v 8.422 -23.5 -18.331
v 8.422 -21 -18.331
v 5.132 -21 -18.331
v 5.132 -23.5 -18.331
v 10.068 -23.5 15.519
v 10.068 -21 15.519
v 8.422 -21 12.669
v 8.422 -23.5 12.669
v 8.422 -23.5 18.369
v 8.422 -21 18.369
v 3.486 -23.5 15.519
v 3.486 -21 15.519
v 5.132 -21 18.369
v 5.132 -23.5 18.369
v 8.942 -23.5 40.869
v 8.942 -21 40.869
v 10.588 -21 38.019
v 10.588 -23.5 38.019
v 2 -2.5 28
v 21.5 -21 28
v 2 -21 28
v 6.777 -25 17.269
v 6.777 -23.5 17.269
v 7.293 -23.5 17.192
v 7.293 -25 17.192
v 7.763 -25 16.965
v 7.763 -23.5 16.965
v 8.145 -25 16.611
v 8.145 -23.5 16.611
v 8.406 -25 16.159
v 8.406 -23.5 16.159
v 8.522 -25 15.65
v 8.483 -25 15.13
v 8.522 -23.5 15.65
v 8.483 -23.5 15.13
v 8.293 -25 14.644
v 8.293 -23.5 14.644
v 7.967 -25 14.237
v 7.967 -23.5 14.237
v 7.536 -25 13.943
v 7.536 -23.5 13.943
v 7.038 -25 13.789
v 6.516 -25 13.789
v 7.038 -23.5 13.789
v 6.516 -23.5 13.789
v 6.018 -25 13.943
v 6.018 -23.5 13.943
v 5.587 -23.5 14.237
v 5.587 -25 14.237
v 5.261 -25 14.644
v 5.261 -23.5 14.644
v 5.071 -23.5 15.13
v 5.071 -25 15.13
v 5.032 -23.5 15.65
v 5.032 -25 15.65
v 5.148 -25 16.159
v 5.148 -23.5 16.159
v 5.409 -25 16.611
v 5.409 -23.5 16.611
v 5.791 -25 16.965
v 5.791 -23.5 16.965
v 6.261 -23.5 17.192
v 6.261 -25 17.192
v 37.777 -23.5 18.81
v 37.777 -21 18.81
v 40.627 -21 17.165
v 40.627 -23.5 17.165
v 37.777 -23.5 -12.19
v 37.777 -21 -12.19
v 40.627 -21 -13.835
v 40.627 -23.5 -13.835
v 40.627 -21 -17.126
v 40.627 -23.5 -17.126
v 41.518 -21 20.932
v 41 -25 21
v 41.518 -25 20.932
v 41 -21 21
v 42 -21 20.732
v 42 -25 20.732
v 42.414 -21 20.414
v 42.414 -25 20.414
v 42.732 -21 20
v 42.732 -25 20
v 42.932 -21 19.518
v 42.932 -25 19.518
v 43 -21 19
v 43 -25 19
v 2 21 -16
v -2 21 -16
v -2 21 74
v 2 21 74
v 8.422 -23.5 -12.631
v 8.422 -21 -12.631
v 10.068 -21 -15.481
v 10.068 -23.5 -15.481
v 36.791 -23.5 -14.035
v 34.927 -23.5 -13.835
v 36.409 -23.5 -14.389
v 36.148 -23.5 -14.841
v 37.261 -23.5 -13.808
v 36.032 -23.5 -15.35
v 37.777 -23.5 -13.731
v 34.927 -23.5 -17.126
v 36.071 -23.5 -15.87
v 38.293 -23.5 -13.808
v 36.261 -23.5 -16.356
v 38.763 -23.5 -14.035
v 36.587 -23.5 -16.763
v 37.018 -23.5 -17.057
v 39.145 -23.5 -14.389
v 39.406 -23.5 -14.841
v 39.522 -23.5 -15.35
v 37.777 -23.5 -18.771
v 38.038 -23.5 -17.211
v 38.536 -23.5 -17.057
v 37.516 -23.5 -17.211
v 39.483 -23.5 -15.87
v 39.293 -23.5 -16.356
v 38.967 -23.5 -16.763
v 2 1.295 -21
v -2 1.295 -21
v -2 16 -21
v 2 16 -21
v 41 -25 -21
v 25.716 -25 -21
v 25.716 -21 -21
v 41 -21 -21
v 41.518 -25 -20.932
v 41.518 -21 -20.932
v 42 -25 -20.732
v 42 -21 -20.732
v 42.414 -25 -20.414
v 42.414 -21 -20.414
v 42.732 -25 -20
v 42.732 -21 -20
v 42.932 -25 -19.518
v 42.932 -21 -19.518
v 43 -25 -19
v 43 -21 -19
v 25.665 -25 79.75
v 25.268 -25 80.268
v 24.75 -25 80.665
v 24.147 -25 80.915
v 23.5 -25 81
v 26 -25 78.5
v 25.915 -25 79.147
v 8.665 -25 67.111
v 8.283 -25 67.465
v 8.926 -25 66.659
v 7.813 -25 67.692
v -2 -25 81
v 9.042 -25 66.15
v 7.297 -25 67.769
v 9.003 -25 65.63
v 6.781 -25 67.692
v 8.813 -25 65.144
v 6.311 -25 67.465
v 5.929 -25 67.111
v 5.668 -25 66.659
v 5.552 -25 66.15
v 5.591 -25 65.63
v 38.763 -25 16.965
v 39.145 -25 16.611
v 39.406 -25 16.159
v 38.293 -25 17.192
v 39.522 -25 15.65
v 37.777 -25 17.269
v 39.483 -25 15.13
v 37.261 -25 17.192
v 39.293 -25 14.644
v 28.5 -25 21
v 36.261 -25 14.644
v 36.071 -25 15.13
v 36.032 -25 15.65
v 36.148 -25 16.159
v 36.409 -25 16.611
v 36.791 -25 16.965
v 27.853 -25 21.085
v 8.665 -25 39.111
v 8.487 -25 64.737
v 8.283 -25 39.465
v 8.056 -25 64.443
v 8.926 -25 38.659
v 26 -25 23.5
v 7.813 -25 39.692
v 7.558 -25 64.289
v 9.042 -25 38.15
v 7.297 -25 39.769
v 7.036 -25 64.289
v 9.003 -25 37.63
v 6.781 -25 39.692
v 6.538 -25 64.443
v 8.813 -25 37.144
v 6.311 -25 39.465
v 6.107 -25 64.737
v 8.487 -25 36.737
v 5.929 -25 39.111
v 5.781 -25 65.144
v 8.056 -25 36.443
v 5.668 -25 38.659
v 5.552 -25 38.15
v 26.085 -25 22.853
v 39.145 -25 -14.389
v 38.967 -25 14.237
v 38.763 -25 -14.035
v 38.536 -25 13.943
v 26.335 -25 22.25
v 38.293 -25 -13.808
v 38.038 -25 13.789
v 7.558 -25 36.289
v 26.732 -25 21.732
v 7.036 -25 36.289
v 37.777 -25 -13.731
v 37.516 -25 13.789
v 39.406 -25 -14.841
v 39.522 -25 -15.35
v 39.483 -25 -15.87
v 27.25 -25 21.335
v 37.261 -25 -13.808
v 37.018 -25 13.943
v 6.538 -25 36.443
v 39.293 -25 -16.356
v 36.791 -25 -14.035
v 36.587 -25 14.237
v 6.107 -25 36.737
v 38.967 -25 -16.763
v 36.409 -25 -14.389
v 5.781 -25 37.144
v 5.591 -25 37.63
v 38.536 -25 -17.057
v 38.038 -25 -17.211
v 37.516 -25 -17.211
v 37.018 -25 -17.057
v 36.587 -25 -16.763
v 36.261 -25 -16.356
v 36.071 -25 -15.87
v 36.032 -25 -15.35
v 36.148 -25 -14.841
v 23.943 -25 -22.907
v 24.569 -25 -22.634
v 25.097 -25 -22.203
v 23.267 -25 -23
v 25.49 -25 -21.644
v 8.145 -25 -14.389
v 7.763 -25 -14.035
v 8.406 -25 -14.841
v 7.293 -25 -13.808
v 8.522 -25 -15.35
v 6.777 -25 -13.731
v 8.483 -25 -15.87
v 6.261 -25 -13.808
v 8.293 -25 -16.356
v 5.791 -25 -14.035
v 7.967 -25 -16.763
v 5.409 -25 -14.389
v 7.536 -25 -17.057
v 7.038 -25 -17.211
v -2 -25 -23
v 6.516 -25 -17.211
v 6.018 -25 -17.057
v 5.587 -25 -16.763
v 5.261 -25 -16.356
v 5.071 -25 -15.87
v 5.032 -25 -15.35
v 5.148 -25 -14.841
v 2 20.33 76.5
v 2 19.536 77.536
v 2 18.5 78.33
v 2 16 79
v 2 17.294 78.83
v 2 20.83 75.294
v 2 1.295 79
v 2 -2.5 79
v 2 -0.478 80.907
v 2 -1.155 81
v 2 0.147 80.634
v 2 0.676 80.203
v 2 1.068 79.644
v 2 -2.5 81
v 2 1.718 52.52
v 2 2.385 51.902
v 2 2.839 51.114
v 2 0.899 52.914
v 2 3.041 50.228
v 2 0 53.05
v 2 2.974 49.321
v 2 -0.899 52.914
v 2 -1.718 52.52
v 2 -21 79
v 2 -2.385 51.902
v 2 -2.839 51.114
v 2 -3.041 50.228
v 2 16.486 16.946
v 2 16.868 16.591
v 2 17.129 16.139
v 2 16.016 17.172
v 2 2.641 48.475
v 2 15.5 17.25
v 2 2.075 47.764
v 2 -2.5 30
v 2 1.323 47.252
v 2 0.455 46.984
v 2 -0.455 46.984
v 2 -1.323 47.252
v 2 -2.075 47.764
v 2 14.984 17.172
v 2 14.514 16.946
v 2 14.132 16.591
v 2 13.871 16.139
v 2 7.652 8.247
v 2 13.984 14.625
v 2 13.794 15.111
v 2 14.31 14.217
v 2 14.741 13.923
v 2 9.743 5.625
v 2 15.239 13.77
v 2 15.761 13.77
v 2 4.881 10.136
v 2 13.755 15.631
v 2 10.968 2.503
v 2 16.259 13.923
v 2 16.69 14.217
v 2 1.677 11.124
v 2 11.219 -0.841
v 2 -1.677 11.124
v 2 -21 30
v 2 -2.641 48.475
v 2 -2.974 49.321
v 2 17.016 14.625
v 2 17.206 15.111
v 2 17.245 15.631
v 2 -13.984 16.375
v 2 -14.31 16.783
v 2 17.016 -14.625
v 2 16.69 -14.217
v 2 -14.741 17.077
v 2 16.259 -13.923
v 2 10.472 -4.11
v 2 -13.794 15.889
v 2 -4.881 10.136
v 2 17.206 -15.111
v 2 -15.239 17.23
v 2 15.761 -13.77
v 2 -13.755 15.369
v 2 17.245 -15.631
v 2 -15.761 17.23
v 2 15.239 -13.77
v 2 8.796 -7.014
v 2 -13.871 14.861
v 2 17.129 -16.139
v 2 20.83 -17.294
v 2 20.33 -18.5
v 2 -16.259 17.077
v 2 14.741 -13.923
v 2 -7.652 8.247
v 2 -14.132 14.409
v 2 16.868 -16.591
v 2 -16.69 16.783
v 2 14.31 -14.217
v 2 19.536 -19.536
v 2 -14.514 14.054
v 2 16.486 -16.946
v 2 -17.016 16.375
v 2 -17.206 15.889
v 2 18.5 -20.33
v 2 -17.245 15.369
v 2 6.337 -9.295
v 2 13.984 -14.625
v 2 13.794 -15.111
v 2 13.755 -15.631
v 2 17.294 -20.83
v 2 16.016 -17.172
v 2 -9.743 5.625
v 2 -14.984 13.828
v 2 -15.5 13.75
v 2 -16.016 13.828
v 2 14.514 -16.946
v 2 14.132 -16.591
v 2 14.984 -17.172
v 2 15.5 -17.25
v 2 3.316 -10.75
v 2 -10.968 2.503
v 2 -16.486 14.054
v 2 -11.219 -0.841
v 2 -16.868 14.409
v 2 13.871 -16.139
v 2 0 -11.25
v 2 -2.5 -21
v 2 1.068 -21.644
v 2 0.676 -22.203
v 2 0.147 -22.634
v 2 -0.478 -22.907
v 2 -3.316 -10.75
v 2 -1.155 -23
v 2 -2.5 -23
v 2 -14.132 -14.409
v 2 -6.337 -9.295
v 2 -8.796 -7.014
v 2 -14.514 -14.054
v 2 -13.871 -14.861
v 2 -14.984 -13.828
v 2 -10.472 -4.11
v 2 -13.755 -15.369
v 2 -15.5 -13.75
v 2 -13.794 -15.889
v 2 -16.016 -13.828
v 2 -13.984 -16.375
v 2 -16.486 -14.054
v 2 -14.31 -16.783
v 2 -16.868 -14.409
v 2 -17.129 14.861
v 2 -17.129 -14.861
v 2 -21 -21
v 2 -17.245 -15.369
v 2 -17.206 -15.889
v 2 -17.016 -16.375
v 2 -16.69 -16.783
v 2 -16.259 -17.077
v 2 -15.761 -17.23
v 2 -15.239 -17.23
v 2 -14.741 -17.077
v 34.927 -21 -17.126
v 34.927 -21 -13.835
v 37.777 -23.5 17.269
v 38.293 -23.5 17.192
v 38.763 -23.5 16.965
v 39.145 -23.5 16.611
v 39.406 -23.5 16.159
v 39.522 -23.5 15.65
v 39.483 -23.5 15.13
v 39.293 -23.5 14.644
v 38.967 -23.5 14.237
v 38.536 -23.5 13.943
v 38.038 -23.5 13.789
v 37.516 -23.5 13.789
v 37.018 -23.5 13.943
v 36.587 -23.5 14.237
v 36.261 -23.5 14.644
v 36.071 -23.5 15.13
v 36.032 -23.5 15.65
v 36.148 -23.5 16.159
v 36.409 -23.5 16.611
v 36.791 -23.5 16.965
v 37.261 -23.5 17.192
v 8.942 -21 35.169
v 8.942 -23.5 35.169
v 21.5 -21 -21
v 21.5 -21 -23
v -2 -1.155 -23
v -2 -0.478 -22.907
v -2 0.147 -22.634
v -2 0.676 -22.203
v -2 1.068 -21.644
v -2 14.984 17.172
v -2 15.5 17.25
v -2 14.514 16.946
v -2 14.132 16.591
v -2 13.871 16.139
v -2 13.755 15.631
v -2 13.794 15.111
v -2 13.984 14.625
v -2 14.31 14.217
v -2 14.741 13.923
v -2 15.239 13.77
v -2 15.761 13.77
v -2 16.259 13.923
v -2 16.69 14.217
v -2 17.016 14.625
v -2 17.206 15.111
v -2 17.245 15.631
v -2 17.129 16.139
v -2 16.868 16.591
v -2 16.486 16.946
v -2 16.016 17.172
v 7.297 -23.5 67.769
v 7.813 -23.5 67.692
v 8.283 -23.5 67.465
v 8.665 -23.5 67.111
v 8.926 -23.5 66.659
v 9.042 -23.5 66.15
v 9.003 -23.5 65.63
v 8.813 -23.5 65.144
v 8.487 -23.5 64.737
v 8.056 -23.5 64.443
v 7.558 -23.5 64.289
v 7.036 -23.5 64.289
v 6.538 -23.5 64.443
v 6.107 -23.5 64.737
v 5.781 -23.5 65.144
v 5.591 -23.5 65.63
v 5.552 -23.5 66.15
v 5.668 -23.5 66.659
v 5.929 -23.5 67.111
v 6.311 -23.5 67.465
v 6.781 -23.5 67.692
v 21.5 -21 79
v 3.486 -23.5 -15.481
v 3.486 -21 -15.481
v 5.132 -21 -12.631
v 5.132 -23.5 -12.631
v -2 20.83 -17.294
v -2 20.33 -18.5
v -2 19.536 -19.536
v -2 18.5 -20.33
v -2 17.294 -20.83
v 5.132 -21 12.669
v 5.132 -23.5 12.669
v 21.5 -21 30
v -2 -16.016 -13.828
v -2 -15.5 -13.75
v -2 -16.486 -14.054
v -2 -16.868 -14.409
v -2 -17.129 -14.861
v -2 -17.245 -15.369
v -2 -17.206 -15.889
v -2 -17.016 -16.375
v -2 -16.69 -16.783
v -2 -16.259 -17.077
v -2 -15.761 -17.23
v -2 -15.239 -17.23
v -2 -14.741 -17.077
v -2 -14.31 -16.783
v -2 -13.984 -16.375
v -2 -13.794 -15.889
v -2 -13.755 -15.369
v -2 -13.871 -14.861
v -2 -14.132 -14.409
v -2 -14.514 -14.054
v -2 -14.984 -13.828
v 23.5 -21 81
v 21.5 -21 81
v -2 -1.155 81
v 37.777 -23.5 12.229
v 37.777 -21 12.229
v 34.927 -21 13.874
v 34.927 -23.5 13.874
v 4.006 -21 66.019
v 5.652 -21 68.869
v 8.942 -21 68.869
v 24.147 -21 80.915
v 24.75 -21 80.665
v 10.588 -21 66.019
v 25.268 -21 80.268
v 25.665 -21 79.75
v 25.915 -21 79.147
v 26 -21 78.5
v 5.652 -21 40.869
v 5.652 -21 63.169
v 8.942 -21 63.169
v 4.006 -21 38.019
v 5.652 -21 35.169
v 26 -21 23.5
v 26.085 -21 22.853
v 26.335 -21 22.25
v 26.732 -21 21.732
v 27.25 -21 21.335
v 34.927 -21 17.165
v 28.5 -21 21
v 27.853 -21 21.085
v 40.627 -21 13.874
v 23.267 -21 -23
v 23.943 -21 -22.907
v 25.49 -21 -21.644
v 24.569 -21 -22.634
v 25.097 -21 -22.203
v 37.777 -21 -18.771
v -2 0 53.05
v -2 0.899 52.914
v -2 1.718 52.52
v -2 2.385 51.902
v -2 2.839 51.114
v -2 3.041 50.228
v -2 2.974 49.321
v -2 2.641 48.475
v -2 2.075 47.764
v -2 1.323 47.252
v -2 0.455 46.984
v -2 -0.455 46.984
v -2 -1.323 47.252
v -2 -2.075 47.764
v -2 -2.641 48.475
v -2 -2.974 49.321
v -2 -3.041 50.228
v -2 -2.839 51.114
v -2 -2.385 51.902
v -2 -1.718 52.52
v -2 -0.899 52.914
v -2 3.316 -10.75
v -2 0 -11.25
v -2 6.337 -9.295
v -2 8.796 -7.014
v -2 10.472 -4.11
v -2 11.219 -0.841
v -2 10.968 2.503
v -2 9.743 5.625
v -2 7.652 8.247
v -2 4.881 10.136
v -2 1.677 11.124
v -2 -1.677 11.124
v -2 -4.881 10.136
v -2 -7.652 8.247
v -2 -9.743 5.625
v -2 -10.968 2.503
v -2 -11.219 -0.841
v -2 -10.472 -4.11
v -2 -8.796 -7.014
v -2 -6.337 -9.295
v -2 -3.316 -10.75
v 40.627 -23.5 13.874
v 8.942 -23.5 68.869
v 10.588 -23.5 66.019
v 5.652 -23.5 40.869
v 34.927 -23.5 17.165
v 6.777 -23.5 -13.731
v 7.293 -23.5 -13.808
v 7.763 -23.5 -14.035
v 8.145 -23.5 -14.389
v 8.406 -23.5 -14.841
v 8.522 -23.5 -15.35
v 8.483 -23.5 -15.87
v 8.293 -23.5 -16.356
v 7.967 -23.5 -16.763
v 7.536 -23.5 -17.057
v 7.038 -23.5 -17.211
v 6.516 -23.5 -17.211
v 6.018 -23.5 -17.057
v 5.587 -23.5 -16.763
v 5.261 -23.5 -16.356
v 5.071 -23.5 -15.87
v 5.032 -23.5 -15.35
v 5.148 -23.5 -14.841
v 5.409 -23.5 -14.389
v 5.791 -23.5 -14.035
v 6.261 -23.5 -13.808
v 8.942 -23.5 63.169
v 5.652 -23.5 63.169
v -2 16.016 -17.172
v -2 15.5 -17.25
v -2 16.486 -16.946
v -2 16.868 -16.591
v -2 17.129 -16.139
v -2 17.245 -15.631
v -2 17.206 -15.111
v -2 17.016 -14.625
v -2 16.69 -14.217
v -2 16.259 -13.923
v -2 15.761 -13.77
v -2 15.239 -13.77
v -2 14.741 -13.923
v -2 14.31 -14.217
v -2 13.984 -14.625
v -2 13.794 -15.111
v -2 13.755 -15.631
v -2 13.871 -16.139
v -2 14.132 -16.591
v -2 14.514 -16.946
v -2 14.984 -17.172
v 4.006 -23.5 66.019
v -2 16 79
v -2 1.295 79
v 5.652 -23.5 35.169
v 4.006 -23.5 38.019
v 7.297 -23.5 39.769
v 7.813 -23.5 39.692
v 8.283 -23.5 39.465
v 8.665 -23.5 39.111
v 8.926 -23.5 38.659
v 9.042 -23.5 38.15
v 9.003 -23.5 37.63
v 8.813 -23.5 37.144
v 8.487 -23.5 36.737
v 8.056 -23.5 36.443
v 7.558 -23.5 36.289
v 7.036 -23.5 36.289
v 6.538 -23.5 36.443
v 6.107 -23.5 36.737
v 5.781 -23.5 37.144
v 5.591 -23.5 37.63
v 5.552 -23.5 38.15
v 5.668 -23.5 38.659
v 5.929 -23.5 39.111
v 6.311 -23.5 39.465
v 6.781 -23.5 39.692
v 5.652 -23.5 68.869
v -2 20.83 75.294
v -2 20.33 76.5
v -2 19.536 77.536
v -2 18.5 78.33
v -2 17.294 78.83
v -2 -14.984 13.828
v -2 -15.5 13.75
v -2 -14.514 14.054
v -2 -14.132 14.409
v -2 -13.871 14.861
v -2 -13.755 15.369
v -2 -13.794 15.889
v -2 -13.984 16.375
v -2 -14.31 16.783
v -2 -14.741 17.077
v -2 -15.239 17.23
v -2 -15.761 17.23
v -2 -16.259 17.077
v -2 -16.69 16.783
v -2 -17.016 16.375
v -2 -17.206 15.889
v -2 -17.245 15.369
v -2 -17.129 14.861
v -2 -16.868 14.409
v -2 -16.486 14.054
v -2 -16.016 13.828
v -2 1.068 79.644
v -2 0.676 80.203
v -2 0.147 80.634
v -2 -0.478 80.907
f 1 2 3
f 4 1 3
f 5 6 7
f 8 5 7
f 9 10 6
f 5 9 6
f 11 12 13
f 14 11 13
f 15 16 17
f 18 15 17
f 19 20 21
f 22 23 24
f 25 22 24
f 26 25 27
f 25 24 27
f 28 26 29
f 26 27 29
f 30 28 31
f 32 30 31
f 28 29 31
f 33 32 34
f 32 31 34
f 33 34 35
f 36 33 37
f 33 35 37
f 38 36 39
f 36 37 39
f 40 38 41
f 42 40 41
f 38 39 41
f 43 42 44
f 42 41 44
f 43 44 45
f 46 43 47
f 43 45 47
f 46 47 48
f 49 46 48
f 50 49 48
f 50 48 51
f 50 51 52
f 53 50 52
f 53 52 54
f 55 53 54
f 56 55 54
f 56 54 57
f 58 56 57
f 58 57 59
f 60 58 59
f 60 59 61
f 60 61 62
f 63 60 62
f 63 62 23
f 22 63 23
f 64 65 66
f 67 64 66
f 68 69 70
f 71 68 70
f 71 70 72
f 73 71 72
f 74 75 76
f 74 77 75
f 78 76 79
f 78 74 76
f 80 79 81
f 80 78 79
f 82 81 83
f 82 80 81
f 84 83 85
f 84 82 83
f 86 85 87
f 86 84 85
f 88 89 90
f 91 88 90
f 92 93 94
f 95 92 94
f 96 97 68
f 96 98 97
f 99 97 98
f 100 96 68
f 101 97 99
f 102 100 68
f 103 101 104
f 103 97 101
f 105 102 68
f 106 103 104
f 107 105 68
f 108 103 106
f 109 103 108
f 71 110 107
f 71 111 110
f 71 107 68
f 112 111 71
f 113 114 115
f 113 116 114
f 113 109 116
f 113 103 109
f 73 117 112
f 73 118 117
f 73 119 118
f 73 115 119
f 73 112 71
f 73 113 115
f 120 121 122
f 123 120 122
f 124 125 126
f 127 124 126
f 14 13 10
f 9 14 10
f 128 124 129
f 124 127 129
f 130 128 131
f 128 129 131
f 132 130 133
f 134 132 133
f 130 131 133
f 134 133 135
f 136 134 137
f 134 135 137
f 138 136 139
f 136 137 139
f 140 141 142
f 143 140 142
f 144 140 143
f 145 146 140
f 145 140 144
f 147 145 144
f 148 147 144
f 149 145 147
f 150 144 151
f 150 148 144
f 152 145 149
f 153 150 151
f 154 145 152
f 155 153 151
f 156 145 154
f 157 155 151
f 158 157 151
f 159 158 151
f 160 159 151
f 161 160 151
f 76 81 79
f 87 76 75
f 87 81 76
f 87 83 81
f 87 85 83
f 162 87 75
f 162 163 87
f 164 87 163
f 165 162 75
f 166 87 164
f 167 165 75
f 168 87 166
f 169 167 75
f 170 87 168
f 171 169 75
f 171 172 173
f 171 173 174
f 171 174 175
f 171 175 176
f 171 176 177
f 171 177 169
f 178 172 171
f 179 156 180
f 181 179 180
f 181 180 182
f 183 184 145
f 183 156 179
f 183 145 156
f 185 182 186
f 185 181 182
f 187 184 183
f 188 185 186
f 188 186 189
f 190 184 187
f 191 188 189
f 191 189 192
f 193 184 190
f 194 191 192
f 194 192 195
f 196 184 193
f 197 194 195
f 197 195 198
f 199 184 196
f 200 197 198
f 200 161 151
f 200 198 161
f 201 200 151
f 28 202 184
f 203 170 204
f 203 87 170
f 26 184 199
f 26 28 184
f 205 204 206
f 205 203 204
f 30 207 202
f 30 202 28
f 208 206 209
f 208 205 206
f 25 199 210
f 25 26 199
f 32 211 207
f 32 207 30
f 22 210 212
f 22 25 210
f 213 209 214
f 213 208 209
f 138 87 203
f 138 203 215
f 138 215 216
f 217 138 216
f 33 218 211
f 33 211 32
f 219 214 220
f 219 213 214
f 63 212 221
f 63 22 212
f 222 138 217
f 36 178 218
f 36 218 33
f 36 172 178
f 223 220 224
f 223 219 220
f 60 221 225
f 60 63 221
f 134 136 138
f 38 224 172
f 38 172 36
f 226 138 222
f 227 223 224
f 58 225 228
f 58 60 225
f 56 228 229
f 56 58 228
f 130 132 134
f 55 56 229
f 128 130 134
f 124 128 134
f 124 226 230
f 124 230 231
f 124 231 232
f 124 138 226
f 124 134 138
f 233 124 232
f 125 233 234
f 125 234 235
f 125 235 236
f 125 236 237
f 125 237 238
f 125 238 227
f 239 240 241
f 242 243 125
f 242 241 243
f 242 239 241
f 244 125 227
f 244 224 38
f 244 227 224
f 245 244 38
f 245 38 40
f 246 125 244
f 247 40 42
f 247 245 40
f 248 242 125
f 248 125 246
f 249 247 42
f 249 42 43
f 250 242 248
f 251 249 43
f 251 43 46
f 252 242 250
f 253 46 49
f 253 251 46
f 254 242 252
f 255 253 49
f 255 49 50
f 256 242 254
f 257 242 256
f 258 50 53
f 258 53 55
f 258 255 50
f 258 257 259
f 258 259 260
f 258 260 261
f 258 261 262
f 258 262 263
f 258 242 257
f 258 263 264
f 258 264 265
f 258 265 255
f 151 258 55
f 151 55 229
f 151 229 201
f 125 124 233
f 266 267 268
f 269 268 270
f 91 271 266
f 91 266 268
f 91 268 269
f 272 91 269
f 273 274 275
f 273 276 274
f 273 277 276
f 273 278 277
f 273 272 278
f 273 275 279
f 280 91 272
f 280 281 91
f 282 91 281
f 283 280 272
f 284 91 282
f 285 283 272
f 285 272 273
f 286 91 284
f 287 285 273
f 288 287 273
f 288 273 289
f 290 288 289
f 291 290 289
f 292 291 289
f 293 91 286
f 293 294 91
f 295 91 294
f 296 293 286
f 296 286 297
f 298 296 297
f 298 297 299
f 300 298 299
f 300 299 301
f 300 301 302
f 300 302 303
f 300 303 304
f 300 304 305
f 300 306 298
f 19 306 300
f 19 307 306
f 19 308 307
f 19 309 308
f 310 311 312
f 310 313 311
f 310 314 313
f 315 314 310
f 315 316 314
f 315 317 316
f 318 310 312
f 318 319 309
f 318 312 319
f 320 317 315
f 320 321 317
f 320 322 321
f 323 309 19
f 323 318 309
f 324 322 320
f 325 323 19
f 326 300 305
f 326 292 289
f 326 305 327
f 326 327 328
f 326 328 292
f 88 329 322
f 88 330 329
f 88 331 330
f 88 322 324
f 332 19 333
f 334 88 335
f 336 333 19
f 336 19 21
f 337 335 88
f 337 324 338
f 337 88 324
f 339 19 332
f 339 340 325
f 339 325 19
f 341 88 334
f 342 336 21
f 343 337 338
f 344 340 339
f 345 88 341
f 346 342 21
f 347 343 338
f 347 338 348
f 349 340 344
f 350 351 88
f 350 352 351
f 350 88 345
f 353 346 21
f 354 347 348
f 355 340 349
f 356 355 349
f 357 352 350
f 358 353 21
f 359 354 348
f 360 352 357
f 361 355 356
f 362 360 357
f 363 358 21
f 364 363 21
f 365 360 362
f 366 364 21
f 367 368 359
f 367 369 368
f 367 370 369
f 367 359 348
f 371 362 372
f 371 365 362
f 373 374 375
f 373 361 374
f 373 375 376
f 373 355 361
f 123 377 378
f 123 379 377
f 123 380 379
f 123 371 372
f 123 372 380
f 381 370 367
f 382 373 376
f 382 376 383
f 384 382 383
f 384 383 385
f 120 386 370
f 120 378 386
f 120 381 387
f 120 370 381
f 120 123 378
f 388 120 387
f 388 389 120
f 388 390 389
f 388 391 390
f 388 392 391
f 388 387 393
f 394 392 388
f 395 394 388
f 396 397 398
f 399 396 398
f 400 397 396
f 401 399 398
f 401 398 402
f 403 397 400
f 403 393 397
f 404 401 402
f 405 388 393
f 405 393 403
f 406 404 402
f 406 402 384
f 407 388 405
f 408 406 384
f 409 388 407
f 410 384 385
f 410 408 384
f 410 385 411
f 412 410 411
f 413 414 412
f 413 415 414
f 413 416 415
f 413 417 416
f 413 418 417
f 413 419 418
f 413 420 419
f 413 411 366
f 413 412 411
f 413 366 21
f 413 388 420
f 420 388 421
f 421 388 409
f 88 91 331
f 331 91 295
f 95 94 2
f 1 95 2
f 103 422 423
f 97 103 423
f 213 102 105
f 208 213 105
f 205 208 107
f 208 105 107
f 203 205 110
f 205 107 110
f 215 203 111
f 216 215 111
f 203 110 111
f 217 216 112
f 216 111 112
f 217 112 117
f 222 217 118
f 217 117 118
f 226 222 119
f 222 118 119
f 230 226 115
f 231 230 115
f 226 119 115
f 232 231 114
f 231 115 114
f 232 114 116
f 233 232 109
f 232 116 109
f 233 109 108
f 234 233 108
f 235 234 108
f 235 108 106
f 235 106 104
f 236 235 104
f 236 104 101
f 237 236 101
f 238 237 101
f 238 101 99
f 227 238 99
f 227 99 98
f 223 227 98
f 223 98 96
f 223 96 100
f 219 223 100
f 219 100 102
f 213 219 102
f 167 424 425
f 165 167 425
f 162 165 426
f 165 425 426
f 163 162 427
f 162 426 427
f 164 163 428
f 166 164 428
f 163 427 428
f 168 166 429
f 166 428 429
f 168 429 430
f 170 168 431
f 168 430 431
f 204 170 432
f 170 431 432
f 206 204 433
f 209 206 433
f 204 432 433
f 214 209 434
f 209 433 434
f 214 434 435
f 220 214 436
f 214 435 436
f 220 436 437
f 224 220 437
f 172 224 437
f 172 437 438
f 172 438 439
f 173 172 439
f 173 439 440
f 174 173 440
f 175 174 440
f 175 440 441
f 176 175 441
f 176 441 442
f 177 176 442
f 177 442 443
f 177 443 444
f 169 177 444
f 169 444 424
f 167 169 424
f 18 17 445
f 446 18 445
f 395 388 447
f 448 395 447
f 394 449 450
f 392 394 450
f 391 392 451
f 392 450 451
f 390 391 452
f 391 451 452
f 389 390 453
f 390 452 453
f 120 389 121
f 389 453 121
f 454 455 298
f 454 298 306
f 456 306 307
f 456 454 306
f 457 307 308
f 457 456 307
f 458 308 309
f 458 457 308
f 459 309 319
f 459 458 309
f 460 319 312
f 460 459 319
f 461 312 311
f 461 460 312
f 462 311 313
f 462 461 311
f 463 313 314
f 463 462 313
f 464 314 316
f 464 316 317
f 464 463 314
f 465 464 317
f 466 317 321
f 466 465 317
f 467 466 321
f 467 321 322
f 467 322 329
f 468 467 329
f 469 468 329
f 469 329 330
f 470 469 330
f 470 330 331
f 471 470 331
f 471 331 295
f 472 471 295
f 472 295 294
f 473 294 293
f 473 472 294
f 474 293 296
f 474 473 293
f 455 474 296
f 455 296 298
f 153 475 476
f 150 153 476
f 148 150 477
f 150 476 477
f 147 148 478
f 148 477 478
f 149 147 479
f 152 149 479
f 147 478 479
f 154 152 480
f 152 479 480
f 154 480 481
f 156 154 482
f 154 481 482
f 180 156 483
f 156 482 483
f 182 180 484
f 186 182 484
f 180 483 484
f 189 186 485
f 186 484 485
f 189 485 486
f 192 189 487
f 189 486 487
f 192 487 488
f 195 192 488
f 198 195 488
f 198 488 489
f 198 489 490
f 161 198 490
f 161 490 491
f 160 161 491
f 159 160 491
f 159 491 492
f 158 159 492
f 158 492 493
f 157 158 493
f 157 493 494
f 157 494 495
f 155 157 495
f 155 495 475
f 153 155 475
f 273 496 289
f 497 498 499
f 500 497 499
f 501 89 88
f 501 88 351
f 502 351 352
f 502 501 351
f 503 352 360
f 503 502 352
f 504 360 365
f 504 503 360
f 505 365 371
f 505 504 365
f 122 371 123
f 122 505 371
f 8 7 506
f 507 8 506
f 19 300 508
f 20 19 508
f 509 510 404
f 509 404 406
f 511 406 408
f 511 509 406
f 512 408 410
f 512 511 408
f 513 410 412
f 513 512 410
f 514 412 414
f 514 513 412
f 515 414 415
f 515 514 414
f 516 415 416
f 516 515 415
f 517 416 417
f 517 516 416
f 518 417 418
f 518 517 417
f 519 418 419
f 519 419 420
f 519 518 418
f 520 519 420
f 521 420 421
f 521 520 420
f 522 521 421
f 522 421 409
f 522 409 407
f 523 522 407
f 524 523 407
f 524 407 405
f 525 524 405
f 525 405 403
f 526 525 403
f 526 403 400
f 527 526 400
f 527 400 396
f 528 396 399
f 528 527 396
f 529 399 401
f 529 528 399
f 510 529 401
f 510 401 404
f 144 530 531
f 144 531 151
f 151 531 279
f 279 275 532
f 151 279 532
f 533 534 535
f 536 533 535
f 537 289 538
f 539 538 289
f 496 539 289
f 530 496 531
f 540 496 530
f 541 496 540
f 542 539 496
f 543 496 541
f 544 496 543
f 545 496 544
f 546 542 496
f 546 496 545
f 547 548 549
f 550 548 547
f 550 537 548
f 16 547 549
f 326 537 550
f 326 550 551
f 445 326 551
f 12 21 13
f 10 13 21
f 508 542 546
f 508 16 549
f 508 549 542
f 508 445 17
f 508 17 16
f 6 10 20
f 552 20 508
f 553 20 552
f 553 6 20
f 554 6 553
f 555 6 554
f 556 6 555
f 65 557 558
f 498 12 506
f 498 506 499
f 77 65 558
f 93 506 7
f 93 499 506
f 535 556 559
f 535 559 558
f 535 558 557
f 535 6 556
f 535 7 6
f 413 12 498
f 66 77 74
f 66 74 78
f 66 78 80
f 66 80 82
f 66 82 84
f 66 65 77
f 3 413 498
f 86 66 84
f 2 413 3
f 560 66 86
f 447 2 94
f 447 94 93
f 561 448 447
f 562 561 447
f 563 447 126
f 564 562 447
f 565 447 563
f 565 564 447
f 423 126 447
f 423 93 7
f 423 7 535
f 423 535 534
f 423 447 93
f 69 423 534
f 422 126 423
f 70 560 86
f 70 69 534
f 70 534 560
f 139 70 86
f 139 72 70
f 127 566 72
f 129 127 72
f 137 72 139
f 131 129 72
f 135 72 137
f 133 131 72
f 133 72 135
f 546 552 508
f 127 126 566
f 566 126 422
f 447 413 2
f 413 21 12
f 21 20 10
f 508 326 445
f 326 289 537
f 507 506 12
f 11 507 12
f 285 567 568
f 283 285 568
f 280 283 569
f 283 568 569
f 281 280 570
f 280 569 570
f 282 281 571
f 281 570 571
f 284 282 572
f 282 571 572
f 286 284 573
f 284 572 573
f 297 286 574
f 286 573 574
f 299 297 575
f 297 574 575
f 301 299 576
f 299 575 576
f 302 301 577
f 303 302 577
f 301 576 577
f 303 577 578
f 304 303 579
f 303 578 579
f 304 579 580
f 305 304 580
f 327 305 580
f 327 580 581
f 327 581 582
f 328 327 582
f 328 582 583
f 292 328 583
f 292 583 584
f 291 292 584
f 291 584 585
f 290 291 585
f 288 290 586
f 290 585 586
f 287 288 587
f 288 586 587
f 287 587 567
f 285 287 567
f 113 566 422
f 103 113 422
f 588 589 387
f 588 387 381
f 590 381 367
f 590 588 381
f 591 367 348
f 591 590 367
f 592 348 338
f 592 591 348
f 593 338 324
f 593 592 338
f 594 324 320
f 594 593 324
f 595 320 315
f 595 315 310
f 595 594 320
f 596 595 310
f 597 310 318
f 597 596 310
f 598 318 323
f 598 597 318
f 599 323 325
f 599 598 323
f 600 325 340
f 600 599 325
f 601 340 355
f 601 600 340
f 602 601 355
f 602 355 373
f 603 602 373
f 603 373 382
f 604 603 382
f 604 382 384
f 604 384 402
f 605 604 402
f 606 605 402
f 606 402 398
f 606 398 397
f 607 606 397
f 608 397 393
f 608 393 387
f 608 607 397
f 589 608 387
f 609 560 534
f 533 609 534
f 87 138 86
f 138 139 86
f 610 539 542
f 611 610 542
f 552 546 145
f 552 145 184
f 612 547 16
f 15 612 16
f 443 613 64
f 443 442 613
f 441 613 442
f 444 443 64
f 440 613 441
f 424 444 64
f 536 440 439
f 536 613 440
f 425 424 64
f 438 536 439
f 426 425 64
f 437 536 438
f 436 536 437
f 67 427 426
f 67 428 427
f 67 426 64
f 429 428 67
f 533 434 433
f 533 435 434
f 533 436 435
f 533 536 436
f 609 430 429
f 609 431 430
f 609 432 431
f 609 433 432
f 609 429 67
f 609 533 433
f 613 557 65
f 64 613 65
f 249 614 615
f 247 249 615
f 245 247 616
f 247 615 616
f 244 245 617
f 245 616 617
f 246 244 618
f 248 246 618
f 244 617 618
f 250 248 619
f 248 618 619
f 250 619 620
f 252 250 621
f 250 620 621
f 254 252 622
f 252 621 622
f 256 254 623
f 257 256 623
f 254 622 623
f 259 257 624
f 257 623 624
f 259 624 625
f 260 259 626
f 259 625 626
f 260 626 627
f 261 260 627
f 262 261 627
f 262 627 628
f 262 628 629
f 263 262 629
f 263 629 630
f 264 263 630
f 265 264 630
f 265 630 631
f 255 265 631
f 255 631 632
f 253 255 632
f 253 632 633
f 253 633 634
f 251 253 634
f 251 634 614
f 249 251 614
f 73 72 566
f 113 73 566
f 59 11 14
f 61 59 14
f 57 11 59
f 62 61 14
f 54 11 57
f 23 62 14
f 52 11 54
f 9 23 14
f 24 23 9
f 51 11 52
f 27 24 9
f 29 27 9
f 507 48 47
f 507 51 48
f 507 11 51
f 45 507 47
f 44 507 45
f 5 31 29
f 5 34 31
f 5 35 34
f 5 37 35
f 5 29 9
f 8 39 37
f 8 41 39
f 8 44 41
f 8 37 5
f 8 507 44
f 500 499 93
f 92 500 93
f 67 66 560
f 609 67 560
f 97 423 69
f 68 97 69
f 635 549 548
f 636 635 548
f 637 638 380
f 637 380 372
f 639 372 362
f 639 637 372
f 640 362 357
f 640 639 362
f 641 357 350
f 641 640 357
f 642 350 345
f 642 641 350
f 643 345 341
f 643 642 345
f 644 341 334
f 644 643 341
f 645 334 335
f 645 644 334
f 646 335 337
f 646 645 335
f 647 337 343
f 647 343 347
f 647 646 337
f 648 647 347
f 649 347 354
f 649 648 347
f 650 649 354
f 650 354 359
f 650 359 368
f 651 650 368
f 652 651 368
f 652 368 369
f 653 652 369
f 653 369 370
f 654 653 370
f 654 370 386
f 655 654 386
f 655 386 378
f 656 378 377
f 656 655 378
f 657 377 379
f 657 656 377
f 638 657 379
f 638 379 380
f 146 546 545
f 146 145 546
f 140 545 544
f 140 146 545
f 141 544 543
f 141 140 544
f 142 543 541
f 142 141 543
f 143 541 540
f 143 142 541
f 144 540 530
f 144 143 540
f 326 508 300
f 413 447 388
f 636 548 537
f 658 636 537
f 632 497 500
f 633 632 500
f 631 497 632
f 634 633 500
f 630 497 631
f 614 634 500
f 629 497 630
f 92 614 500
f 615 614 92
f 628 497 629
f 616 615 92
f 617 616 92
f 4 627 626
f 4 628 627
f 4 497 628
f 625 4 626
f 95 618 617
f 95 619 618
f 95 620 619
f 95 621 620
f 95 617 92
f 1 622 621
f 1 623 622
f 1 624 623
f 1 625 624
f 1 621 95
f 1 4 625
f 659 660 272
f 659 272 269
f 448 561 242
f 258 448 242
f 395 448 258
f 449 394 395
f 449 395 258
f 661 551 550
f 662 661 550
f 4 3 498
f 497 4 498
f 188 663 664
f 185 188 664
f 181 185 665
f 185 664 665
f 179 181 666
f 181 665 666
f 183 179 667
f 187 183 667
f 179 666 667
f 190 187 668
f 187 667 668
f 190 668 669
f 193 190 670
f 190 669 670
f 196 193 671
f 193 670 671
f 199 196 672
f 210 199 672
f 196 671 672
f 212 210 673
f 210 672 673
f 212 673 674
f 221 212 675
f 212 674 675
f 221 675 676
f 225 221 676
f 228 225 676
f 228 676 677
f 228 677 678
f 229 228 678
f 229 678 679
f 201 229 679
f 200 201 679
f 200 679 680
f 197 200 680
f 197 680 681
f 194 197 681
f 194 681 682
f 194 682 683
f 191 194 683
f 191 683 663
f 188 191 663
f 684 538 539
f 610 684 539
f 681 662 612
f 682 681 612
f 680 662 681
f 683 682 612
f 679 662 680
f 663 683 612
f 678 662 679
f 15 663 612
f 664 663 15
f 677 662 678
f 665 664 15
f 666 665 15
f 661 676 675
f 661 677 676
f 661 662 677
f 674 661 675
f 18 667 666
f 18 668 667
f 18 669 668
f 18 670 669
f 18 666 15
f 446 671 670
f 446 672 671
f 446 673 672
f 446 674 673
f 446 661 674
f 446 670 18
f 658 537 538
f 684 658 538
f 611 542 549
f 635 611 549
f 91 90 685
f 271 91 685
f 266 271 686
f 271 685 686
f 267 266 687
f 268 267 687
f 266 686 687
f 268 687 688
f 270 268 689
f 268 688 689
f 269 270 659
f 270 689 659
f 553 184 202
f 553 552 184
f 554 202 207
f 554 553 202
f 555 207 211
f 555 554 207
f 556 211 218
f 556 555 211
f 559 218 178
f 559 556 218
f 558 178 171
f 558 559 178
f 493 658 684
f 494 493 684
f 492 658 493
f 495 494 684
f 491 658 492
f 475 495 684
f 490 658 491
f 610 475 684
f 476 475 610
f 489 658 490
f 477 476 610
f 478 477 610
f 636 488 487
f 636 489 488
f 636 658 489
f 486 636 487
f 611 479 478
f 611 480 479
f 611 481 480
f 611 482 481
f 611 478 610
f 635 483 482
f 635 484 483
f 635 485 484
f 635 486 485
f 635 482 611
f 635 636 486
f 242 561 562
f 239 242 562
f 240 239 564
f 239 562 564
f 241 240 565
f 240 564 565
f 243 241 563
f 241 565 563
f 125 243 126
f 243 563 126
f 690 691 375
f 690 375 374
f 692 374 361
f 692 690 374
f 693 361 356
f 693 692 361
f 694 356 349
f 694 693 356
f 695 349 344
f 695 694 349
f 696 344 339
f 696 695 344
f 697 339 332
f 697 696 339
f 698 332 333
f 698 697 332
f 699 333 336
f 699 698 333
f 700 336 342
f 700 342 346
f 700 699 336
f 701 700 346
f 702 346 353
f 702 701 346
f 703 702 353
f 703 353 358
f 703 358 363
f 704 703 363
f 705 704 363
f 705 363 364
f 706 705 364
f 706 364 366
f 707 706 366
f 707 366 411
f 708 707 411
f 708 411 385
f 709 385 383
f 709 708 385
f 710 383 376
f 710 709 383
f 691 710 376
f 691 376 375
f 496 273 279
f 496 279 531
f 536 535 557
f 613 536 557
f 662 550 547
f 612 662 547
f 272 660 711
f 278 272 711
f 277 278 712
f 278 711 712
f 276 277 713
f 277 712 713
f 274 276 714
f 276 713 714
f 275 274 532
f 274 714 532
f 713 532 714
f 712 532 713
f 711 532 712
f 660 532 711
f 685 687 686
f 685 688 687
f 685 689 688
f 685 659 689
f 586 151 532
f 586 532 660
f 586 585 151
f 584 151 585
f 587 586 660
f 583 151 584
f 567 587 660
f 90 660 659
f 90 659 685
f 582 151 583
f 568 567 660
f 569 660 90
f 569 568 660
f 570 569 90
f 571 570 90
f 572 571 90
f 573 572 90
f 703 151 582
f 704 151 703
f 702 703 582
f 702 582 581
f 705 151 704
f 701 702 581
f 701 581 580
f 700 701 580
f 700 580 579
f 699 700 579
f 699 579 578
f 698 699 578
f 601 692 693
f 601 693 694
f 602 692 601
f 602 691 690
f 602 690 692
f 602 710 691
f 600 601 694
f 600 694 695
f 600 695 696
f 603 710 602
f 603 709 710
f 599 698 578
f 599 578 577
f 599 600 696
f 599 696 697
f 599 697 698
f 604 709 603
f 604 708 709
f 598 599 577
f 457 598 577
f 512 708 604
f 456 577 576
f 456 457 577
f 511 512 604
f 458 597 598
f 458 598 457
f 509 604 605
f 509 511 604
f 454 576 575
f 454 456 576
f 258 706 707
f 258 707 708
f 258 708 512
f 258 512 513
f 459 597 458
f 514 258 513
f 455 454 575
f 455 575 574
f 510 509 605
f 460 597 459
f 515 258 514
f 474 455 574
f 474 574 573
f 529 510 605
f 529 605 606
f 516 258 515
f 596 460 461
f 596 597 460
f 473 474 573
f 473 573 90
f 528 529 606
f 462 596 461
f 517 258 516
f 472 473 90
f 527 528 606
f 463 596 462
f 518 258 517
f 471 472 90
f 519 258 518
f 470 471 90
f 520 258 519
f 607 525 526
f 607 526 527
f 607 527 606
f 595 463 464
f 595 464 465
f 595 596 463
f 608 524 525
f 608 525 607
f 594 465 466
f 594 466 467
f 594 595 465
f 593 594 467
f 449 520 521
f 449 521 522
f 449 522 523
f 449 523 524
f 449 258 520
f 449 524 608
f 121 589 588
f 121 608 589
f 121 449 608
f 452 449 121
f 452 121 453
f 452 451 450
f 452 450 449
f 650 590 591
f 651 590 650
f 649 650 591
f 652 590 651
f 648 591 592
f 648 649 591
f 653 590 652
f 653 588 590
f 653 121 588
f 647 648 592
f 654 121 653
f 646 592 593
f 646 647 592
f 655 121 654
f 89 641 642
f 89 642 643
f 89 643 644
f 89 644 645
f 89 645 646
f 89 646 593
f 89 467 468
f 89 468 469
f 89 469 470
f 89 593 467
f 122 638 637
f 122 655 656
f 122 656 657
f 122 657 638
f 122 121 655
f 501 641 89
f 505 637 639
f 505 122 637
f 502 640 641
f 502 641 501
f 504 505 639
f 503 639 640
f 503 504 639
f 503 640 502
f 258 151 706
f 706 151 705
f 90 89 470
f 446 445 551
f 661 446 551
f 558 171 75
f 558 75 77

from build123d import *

# Parameters (mm, degrees)
BOSS_EXTRUDE1_DEPTH      = 2
BOSS_EXTRUDE1_DEPTH_BACK = 2
SKETCH1_R                = 1.75
SKETCH1_R_2              = 11.25
SKETCH2_W                = 42
SKETCH2_H                = 4
BOSS_EXTRUDE2_DEPTH      = 45
FILLET4_R                = 2
SKETCH3_R                = 1.75
CUT_EXTRUDE1_DEPTH       = 10
SKETCH3_4_R              = 1.75
CUT_EXTRUDE2_DEPTH       = 2.5
SKETCH10_R               = 3.05
BOSS_EXTRUDE4_DEPTH      = 4
SKETCH11_W               = 58
SKETCH11_H               = 4
BOSS_EXTRUDE5_DEPTH      = 24
SKETCH12_R               = 1.75
CUT_EXTRUDE3_DEPTH       = 24
SKETCH12_3_R             = 1.75
CUT_EXTRUDE4_DEPTH       = 2.5
FILLET5_R                = 2.5
BOSS_EXTRUDE6_DEPTH      = 2
LPATTERN1_COUNT          = 2
LPATTERN1_PITCH          = 51
FILLET6_R                = 2.5
FILLET7_R                = 2.5
FILLET7_OF_MIRROR3_R     = 2.5
SKETCH15_W               = 3.203134656
SKETCH15_H               = 5.191613013
BOSS_EXTRUDE7_DEPTH      = 4
FILLET8_R                = 2.5


with BuildPart() as part:
    # Sketch1 → Boss-Extrude1 (new, two sides: drawn at the far end of the back side and taken through both)
    with BuildSketch(Plane(origin=(0, 0, 0), x_dir=(0, 0, -1), z_dir=(1, 0, 0)).offset(-BOSS_EXTRUDE1_DEPTH_BACK)):
        with BuildLine():
            Line((-16, 21), (16, 21))
            ThreePointArc((16, 21), (19.535533906, 19.535533906), (21, 16))
            Line((21, 16), (21, -21))
            Line((21, -21), (-21, -21))
            Line((-21, -21), (-21, 16))
            ThreePointArc((-21, 16), (-19.535533906, 19.535533906), (-16, 21))
        make_face()
        with Locations((15.5, 15.5)):
            Circle(SKETCH1_R, mode=Mode.SUBTRACT)
        with Locations(Location((-15.5, 15.5, 0), (0, 0, 180))):
            Circle(SKETCH1_R, mode=Mode.SUBTRACT)
        with Locations(Location((15.5, -15.5, 0), (0, 0, 180))):
            Circle(SKETCH1_R, mode=Mode.SUBTRACT)
        with Locations((-15.5, -15.5)):
            Circle(SKETCH1_R, mode=Mode.SUBTRACT)
        Circle(SKETCH1_R_2, mode=Mode.SUBTRACT)
    extrude(amount=BOSS_EXTRUDE1_DEPTH + BOSS_EXTRUDE1_DEPTH_BACK)

    # Sketch2 → Boss-Extrude2 (add)
    with BuildSketch(Plane.ZY.offset(2)):
        with Locations((0, -23)):
            Rectangle(SKETCH2_W, SKETCH2_H)
    extrude(amount=-BOSS_EXTRUDE2_DEPTH)

    # Fillet4
    fillet4_edges = [part.edges().sort_by_distance(p)[0] for p in [
        (43, -23, -21),
        (43, -23, 21),
    ]]
    fillet(fillet4_edges, radius=FILLET4_R)

    # Sketch3 → Cut-Extrude1 (cut)
    with BuildSketch(Plane(origin=(0, -21, 0), x_dir=(1, 0, 0), z_dir=(0, 1, 0))):
        with Locations(Location((37.777001089, 15.480581557, 0), (0, 0, 270))):
            Circle(SKETCH3_R)
        with Locations(Location((37.777001089, -15.519418443, 0), (0, 0, 270))):
            Circle(SKETCH3_R)
        with Locations(Location((6.777001089, -15.519418443, 0), (0, 0, 270))):
            Circle(SKETCH3_R)
        with Locations(Location((6.777001089, 15.480581557, 0), (0, 0, 270))):
            Circle(SKETCH3_R)
    extrude(amount=-CUT_EXTRUDE1_DEPTH, mode=Mode.SUBTRACT)

    # Sketch3<4> → Cut-Extrude2 (cut)
    # profile 1 of 4: a face of its own
    with BuildSketch(Plane(origin=(0, -21, 0), x_dir=(1, 0, 0), z_dir=(0, 1, 0))):
        Polygon((37.777001089, -18.810314977), (40.627001089, -17.16486671), (40.627001089, -13.873970176), (37.777001089, -12.228521908), (34.927001089, -13.873970176), (34.927001089, -17.16486671), align=None)
        with Locations(Location((37.777001089, -15.519418443, 0), (0, 0, 270))):
            Circle(SKETCH3_4_R, mode=Mode.SUBTRACT)
    # profile 2 of 4: a face of its own
    with BuildSketch(Plane(origin=(0, -21, 0), x_dir=(1, 0, 0), z_dir=(0, 1, 0))):
        Polygon((5.131552822, -18.369418443), (8.422449356, -18.369418443), (10.067897623, -15.519418443), (8.422449356, -12.669418443), (5.131552822, -12.669418443), (3.486104555, -15.519418443), align=None)
        with Locations(Location((6.777001089, -15.519418443, 0), (0, 0, 270))):
            Circle(SKETCH3_4_R, mode=Mode.SUBTRACT)
    # profile 3 of 4: a face of its own
    with BuildSketch(Plane(origin=(0, -21, 0), x_dir=(1, 0, 0), z_dir=(0, 1, 0))):
        Polygon((40.627001089, 13.83513329), (40.627001089, 17.126029824), (37.777001089, 18.771478092), (34.927001089, 17.126029824), (34.927001089, 13.83513329), (37.777001089, 12.189685023), align=None)
        with Locations(Location((37.777001089, 15.480581557, 0), (0, 0, 270))):
            Circle(SKETCH3_4_R, mode=Mode.SUBTRACT)
    # profile 4 of 4: a face of its own
    with BuildSketch(Plane(origin=(0, -21, 0), x_dir=(1, 0, 0), z_dir=(0, 1, 0))):
        Polygon((5.131552822, 12.630581557), (8.422449356, 12.630581557), (10.067897623, 15.480581557), (8.422449356, 18.330581557), (5.131552822, 18.330581557), (3.486104555, 15.480581557), align=None)
        with Locations(Location((6.777001089, 15.480581557, 0), (0, 0, 270))):
            Circle(SKETCH3_4_R, mode=Mode.SUBTRACT)
    extrude(amount=-CUT_EXTRUDE2_DEPTH, mode=Mode.SUBTRACT)

    # Sketch10 → Boss-Extrude4 (add)
    with BuildSketch(Plane.ZY.offset(2)):
        with BuildLine():
            Line((16, 21), (21, 21))
            Line((21, 21), (74, 21))
            ThreePointArc((74, 21), (77.535533906, 19.535533906), (79, 16))
            Line((79, 16), (79, -25))
            Line((79, -25), (21, -25))
            Line((21, -25), (21, 16))
            Line((21, 16), (16, 21))
        make_face()
        with Locations((50, 0)):
            Circle(SKETCH10_R, mode=Mode.SUBTRACT)
    extrude(amount=-BOSS_EXTRUDE4_DEPTH)

    # Sketch11 → Boss-Extrude5 (add)
    with BuildSketch(Plane(origin=(2, 0, 0), x_dir=(0, 0, -1), z_dir=(1, 0, 0))):
        with Locations((-50, -23)):
            Rectangle(SKETCH11_W, SKETCH11_H)
    extrude(amount=BOSS_EXTRUDE5_DEPTH)

    # Sketch12 → Cut-Extrude3 (cut)
    with BuildSketch(Plane(origin=(0, -21, 0), x_dir=(1, 0, 0), z_dir=(0, 1, 0))):
        with Locations(Location((7.297001089, -38.019418443, 0), (0, 0, 270))):
            Circle(SKETCH12_R)
        with Locations(Location((7.297001089, -66.019418443, 0), (0, 0, 270))):
            Circle(SKETCH12_R)
    extrude(amount=-CUT_EXTRUDE3_DEPTH, mode=Mode.SUBTRACT)

    # Sketch12<3> → Cut-Extrude4 (cut)
    # profile 1 of 2: a face of its own
    with BuildSketch(Plane(origin=(0, -21, 0), x_dir=(1, 0, 0), z_dir=(0, 1, 0))):
        Polygon((5.651552822, -40.869418443), (8.942449356, -40.869418443), (10.587897623, -38.019418443), (8.942449356, -35.169418443), (5.651552822, -35.169418443), (4.006104555, -38.019418443), align=None)
        with Locations(Location((7.297001089, -38.019418443, 0), (0, 0, 270))):
            Circle(SKETCH12_3_R, mode=Mode.SUBTRACT)
    # profile 2 of 2: a face of its own
    with BuildSketch(Plane(origin=(0, -21, 0), x_dir=(1, 0, 0), z_dir=(0, 1, 0))):
        Polygon((5.651552822, -68.869418443), (8.942449356, -68.869418443), (10.587897623, -66.019418443), (8.942449356, -63.169418443), (5.651552822, -63.169418443), (4.006104555, -66.019418443), align=None)
        with Locations(Location((7.297001089, -66.019418443, 0), (0, 0, 270))):
            Circle(SKETCH12_3_R, mode=Mode.SUBTRACT)
    extrude(amount=-CUT_EXTRUDE4_DEPTH, mode=Mode.SUBTRACT)

    # Fillet5
    fillet5_edges = [part.edges().sort_by_distance(p)[0] for p in [
        (26, -23, 21),
        (26, -23, 79),
    ]]
    fillet(fillet5_edges, radius=FILLET5_R)

    # Sketch14 → Boss-Extrude6 (add)
    with BuildSketch(Plane(origin=(0, 0, -21), x_dir=(-1, 0, 0), z_dir=(0, 0, -1))):
        Polygon((-2, -2.5), (-21.5, -21), (-25.716216216, -21), (-25.716216216, -25), (2, -25), (2, 1.294871795), (-2, 1.294871795), align=None)
    boss_extrude6 = extrude(amount=BOSS_EXTRUDE6_DEPTH)

    # LPattern1: Boss-Extrude6 ×2
    with Locations(*[(0, 0, i * LPATTERN1_PITCH) for i in range(1, LPATTERN1_COUNT)]):
        add(boss_extrude6)

    # Fillet6
    # the kernel refuses this fillet: 2.5 mm, written as the material it takes off along each edge
    with BuildSketch(Plane(origin=(25.716216216, -14.876275643, -23), x_dir=(-1, 0, 0), z_dir=(0, -1, 0))) as fillet6_piece_1:
        with BuildLine():
            CenterArc((2.449489743, -2.5), FILLET6_R, 90, 78.463040967)
            Line((0, -2), (-0.048989795, -1.99))
            ThreePointArc((-0.048989795, -1.99), (-0.05, -1), (-0.05, 0))
            Line((-0.05, 0), (0, 0.05))
            Line((0, 0.05), (2.449489743, 0.05))
            Line((2.449489743, 0.05), (2.449489743, 0))
        make_face()
    extrude(amount=16.247448714, mode=Mode.SUBTRACT)

    # Fillet7
    # the kernel refuses this fillet: 2.5 mm, written as the material it takes off along each edge
    with BuildSketch(Plane(origin=(-8.123724357, 1.294871795, -23), x_dir=(0, -1, 0), z_dir=(1, 0, 0))) as fillet7_piece_1:
        with BuildLine():
            CenterArc((2.449489743, -2.5), FILLET7_R, 90, 78.463040967)
            Line((0, -2), (-0.048989795, -1.99))
            ThreePointArc((-0.048989795, -1.99), (-0.05, -1), (-0.05, 0))
            Line((-0.05, 0), (0, 0.05))
            Line((0, 0.05), (2.449489743, 0.05))
            Line((2.449489743, 0.05), (2.449489743, 0))
        make_face()
    extrude(amount=16.247448714, mode=Mode.SUBTRACT)

    # Mirror3: Boss-Extrude6 across plane
    add(boss_extrude6.mirror(Plane.XY.offset(29)))

    # Fillet7 of Mirror3
    # the kernel refuses this fillet: 2.5 mm, written as the material it takes off along each edge
    with BuildSketch(Plane(origin=(-8.123724357, 1.294871795, 81), x_dir=(0, -1.5735190928007313e-12, -1.0), z_dir=(1, 0, 0))) as fillet7_of_mirror3_piece_1:
        with BuildLine():
            CenterArc((2.5, -2.449489743), FILLET7_OF_MIRROR3_R, 101.536959033, 78.463040967)
            Line((0, -2.449489743), (-0.05, -2.449489743))
            Line((-0.05, -2.449489743), (-0.05, 0))
            Line((-0.05, 0), (0, 0.05))
            ThreePointArc((0, 0.05), (1, 0.05), (1.99, 0.048989795))
            Line((1.99, 0.048989795), (2, 0))
        make_face()
    extrude(amount=16.247448714, mode=Mode.SUBTRACT)

    # Sketch15 → Boss-Extrude7 (add)
    with BuildSketch(Plane(origin=(0, -21, 0), x_dir=(1, 0, 0), z_dir=(0, 1, 0))):
        with Locations((24.398432672, -78.404193494)):
            Rectangle(SKETCH15_W, SKETCH15_H)
    extrude(amount=-BOSS_EXTRUDE7_DEPTH)

    # Fillet8
    fillet8_edges = [part.edges().sort_by_distance(p)[0] for p in [
        (26, -23, 81),
    ]]
    fillet(fillet8_edges, radius=FILLET8_R)


solid = part.part
